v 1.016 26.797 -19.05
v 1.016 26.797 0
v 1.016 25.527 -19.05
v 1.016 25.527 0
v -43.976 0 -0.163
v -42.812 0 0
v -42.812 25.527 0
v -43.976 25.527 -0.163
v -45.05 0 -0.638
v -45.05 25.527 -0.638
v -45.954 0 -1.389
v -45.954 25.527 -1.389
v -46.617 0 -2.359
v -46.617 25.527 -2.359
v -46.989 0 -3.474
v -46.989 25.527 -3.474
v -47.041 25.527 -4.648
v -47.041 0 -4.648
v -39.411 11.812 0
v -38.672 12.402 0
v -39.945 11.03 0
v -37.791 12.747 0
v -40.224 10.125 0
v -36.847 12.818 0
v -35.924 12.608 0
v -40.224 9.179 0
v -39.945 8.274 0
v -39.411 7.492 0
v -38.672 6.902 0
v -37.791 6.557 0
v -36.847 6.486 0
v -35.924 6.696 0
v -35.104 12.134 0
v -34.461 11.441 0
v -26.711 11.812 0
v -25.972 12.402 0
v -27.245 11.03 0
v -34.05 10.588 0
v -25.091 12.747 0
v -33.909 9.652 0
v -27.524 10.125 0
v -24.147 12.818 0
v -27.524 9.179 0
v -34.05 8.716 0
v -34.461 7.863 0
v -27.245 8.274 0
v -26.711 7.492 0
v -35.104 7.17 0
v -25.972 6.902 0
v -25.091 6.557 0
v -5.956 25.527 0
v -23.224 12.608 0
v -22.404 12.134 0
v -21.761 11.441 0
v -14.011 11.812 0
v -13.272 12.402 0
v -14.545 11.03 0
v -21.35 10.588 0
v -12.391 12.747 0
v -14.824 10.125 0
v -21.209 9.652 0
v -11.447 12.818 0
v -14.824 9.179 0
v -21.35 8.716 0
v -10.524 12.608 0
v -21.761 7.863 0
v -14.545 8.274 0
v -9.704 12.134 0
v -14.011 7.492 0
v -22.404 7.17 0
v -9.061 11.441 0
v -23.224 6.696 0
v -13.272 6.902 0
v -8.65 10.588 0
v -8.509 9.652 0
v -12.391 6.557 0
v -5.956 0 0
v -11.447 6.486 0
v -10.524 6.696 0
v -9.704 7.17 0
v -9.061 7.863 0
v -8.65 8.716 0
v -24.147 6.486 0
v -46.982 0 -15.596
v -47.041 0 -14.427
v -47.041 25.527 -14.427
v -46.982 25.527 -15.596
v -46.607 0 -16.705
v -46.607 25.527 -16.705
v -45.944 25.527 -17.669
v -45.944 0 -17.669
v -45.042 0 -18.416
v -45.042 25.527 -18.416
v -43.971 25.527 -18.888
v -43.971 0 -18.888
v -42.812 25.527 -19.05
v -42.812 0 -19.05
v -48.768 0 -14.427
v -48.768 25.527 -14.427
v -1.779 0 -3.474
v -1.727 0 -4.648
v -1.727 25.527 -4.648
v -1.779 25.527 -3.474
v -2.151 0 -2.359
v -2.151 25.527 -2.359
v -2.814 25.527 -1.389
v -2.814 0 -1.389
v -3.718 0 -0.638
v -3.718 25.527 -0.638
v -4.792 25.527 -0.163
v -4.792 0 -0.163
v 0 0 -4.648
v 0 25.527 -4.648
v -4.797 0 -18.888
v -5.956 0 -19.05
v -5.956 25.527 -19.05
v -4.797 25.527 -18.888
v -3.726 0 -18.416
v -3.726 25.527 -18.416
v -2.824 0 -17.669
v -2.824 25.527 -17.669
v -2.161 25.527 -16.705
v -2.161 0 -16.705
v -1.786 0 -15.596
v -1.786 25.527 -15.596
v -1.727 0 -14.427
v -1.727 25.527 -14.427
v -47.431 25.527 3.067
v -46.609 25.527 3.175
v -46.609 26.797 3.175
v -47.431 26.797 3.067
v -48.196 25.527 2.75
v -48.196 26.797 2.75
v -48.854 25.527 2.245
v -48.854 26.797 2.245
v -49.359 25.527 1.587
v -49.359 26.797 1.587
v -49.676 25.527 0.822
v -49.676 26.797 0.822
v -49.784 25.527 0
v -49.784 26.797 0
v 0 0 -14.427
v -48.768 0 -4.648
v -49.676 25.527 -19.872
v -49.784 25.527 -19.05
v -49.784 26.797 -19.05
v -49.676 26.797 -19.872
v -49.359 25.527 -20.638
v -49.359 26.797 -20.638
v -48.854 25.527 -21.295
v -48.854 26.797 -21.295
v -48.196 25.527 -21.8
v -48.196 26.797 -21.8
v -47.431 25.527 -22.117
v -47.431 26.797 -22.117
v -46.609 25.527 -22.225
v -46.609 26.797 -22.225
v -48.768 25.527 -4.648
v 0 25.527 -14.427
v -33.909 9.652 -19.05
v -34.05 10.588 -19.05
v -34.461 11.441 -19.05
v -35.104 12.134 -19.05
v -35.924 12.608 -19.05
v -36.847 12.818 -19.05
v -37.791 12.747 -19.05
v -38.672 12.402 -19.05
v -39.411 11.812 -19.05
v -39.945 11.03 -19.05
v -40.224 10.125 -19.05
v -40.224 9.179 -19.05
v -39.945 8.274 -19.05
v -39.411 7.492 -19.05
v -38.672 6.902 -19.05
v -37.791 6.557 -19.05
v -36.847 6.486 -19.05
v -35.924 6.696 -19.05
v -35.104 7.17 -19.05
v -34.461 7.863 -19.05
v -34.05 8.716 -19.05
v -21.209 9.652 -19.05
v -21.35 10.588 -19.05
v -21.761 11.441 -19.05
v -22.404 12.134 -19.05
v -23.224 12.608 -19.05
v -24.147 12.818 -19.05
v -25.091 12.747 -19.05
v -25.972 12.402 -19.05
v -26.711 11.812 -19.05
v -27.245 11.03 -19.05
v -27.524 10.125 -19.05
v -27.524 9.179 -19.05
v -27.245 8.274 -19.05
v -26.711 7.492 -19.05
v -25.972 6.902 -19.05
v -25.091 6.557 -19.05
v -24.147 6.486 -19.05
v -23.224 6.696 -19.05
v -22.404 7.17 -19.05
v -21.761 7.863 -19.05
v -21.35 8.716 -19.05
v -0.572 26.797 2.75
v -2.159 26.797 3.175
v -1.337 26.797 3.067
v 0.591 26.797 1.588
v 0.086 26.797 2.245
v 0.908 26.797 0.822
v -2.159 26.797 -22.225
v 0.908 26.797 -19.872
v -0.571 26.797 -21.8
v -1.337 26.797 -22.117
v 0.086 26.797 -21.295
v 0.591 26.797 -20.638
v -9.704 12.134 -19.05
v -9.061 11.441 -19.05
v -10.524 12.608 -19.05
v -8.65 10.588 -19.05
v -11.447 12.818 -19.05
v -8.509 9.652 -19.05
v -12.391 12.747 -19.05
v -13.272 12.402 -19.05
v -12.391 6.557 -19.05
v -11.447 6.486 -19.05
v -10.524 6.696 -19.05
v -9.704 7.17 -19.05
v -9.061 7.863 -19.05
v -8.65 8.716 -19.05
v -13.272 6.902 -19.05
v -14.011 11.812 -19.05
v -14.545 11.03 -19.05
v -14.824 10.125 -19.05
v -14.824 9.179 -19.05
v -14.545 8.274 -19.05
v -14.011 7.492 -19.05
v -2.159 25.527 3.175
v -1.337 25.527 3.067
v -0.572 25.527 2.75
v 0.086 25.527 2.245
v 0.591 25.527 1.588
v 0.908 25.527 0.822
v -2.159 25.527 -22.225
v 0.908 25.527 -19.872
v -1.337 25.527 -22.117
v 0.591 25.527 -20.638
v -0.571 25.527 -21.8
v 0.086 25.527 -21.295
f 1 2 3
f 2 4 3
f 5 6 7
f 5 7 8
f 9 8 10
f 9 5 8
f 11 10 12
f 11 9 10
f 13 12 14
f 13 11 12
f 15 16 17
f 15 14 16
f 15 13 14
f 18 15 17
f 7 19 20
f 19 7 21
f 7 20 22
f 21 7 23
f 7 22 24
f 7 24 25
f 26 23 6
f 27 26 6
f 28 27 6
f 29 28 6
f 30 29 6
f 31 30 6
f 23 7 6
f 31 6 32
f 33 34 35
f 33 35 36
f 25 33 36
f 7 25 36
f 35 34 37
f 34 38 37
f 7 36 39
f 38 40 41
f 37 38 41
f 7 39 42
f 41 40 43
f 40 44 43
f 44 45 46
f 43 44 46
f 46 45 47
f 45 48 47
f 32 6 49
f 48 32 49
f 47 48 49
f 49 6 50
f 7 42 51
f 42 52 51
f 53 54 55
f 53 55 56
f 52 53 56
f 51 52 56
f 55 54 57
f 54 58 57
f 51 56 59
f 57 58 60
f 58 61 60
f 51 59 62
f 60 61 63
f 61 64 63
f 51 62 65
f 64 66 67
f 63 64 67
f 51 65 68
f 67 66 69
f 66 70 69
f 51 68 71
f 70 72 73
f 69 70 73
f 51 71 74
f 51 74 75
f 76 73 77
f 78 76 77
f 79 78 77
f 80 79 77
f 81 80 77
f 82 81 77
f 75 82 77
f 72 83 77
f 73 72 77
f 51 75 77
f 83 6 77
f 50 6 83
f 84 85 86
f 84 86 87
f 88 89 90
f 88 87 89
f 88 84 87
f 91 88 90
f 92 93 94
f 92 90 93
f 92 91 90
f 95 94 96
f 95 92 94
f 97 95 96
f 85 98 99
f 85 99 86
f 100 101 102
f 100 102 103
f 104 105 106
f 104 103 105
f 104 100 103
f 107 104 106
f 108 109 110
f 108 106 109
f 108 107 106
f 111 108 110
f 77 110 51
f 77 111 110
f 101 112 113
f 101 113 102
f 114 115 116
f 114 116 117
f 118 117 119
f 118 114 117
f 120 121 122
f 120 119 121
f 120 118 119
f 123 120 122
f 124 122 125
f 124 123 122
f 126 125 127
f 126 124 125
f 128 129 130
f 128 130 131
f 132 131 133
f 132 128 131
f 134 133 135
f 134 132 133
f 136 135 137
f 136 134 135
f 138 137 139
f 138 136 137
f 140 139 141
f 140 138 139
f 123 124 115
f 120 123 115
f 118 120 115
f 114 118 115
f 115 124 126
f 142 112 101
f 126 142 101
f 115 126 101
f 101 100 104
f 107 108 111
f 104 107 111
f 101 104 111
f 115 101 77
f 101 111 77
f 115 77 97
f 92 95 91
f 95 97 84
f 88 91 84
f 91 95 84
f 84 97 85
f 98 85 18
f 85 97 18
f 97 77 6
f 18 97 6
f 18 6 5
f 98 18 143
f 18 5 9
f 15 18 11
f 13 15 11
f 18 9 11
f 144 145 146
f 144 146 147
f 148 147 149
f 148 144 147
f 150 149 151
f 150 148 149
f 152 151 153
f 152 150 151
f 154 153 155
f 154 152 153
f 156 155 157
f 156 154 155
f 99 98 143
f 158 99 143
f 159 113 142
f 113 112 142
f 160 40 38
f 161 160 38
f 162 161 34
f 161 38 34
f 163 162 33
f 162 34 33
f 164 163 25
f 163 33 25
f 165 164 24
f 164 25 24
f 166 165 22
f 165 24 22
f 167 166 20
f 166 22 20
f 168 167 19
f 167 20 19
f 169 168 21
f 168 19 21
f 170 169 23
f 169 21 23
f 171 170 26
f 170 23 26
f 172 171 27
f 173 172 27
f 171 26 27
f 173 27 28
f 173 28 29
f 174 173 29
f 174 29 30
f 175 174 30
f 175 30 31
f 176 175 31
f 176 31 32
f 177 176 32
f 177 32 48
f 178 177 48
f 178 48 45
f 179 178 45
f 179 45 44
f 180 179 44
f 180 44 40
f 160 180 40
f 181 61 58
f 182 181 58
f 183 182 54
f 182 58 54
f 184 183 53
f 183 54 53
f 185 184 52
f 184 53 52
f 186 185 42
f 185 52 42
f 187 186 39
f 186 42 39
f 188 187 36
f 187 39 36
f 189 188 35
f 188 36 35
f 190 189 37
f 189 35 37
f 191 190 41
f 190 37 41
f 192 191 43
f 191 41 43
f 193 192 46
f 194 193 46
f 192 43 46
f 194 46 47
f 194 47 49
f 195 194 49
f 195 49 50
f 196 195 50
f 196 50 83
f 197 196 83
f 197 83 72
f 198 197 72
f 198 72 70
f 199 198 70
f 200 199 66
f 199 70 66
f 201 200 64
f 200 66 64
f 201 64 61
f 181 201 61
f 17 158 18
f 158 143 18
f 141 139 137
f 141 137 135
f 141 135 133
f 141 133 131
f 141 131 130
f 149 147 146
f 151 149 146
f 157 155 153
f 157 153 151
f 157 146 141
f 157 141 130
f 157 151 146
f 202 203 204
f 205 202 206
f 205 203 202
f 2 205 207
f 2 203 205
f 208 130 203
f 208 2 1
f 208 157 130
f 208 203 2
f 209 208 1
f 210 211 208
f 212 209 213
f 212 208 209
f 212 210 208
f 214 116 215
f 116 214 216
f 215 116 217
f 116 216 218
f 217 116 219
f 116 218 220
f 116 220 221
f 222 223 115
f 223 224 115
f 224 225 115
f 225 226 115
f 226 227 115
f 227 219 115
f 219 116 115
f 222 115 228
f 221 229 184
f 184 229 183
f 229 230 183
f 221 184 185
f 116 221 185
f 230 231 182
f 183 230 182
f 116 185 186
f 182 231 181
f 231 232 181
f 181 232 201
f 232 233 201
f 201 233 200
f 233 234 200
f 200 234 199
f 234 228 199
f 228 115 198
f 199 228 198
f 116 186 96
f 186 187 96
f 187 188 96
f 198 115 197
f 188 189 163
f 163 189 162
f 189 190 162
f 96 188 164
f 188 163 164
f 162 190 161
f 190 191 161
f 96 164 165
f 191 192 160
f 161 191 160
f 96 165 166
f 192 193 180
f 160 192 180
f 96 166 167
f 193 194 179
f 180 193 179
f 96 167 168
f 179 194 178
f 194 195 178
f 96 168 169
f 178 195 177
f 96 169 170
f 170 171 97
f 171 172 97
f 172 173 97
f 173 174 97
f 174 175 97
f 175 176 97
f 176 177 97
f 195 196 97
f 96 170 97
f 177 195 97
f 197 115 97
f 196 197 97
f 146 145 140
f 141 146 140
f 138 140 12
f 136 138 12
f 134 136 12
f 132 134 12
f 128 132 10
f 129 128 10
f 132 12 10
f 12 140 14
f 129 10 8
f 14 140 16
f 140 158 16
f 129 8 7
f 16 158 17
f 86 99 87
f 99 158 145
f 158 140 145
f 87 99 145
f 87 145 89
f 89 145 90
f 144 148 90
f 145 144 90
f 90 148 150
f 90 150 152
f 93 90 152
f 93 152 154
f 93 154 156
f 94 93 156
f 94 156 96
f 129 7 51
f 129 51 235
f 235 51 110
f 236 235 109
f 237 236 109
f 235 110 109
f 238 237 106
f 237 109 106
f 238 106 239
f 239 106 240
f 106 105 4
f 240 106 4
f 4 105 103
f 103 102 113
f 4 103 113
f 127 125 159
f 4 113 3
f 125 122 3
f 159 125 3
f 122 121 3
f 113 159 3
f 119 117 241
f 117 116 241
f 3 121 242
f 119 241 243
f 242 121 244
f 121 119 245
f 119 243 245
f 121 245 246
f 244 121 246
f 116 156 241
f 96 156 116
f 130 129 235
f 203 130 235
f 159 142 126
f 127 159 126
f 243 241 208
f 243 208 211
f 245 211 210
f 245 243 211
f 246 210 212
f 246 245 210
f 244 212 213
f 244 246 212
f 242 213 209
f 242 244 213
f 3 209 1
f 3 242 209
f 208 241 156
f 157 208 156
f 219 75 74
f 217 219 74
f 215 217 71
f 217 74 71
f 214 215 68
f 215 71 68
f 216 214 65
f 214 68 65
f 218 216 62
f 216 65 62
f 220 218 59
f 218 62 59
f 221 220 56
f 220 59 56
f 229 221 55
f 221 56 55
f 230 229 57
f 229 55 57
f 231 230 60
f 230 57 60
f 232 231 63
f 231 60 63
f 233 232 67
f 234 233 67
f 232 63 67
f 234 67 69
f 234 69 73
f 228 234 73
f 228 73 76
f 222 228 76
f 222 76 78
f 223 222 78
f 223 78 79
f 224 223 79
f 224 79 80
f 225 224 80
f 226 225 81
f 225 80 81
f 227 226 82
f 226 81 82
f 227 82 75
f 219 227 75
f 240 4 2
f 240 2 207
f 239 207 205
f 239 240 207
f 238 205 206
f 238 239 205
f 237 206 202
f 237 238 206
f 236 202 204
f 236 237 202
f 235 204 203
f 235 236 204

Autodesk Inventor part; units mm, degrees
ref_plane "YZ Plane" through (0, 0, 0) normal (1, 0, 0) x (0, 1, 0)
ref_plane "XZ Plane" through (0, 0, 0) normal (0, 1, 0) x (-1, 0, 0)
ref_plane "XY Plane" through (0, 0, 0) normal (0, 0, 1) x (1, 0, 0)
sketch "Sketch1" plane through (0, 0, 0) normal (0, 1, 0) x (-1, 0, 0)
  line L0 (0, -4.6482) -> (0, -14.4272)
  line L1 (5.9563, -19.05) -> (42.8117, -19.05)
  line L2 (48.768, -14.4272) -> (48.768, -4.6482)
  line L3 (42.8117, 0) -> (5.9563, 0)
  line L4 (0, -14.4272) -> (1.7272, -14.4272)
  line L5 (48.768, -4.6482) -> (47.0408, -4.6482)
  line L6 (48.768, -14.4272) -> (47.0408, -14.4272)
  line L7 (0, -4.6482) -> (1.7272, -4.6482)
  line L8 (24.384, 0) -> (24.384, -19.05) construction
  arc A0 (5.9563, 0) -> (1.7272, -4.6482) centre (5.9563, -4.248) ccw
  arc A1 (1.7272, -14.4272) -> (5.9563, -19.05) centre (5.9586, -14.802) ccw
  arc A2 (47.0408, -4.6482) -> (42.8117, 0) centre (42.8117, -4.248) ccw
  arc A3 (42.8117, -19.05) -> (47.0408, -14.4272) centre (42.8094, -14.802) ccw
  point P0 (0, 0)
  dimension "d1" = 19.05
  dimension "d2" = 48.768
  dimension "d3" = 36.8554
  dimension "d4" = 1.7272
  dimension "d6" = 9.779
  dimension "d8" = 24.384
  dimension "d9" = 4.6482
extrude "Extrusion1" add sketch "Sketch1" along normal blind 25.527
sketch "Sketch2" plane through (0, 25.527, 0) normal (0, 1, 0) x (1, 0, 0)
  line L0 (-46.609, -3.175) -> (-2.159, -3.175)
  line L1 (1.016, 0) -> (1.016, 19.05)
  line L2 (-2.159, 22.225) -> (-46.609, 22.225)
  line L3 (-49.784, 19.05) -> (-49.784, 0)
  line L4 (-5.9563, 19.05) -> (-42.8117, 19.05) projected
  line L5 (-48.768, 14.4272) -> (-48.768, 4.6482) projected
  line L6 (-42.8117, 0) -> (-5.9563, 0) projected
  line L7 (0, 4.6482) -> (0, 14.4272) projected
  arc A0 (-49.784, 0) -> (-46.609, -3.175) centre (-46.609, 0) ccw
  arc A1 (-46.609, 22.225) -> (-49.784, 19.05) centre (-46.609, 19.05) ccw
  arc A2 (1.016, 19.05) -> (-2.159, 22.225) centre (-2.159, 19.05) ccw
  arc A3 (-2.159, -3.175) -> (1.016, 0) centre (-2.159, 0) ccw
  point P0 (0, 0)
  point P1 (-49.784, -3.175)
  point P2 (1.016, 22.225)
  point P3 (-49.784, 22.225)
  dimension "d13" = 3.175
  dimension "d16" = 1.016
  dimension "d17" = 25.4
  dimension "d18" = 50.8
  dimension "d19" = 3.175
extrude "Extrusion2" add sketch "Sketch2" along normal blind 1.27
sketch "Sketch3" plane through (-42.8117, 0, 0) normal (0, 0, 1) x (1, 0, 0)
  circle A0 centre (5.7277, 9.652) radius 3.175
  circle A1 centre (18.4277, 9.652) radius 3.175
  circle A2 centre (31.1277, 9.652) radius 3.175
  line L0 (-5.9563, 0) -> (-5.9563, 25.527) projected
  line L1 (0, 25.527) -> (36.8554, 25.527) projected
  point P0 (42.8117, 0)
  point P1 (43.8277, 25.527)
  point P2 (-6.9723, 25.527)
  dimension "d22" = 12.7
  dimension "d23" = 12.7
  dimension "d25" = 15.875
  dimension "d26" = 6.35
  dimension "d29" = 12.7
extrude "Extrusion3" cut sketch "Sketch3" against normal through all
equation "\"d8\" = 0.5 * d2"
properties part number "ELEV_015_CRSHBLCK1" material "ABS Plastic"
